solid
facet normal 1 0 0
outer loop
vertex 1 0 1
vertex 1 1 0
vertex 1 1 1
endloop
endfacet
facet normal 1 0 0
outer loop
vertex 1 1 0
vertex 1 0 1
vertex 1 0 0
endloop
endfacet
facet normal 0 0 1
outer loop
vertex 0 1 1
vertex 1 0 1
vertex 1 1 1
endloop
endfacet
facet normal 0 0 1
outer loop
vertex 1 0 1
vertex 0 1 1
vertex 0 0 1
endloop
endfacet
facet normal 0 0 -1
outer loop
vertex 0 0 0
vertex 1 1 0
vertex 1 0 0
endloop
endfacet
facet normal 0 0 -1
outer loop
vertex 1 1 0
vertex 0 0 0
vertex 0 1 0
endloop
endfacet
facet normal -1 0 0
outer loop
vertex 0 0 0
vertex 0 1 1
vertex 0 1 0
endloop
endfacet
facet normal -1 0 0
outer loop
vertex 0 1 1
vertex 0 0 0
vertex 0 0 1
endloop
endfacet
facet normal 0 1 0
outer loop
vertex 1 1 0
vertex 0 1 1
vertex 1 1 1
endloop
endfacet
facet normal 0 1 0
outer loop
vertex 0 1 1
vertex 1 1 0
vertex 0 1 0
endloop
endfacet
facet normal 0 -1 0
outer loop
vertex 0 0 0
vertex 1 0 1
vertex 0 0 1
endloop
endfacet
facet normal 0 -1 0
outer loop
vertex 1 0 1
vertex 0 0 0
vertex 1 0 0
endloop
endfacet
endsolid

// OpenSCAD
// Volume: 1, SurfaceArea: 6
intersection() {
    minkowski() {
        intersection() {
            translate([-2,0,0]) cube(1);
            translate([2,0,0]) cube(1);
        }
        cube();
    }
    cube();
}
